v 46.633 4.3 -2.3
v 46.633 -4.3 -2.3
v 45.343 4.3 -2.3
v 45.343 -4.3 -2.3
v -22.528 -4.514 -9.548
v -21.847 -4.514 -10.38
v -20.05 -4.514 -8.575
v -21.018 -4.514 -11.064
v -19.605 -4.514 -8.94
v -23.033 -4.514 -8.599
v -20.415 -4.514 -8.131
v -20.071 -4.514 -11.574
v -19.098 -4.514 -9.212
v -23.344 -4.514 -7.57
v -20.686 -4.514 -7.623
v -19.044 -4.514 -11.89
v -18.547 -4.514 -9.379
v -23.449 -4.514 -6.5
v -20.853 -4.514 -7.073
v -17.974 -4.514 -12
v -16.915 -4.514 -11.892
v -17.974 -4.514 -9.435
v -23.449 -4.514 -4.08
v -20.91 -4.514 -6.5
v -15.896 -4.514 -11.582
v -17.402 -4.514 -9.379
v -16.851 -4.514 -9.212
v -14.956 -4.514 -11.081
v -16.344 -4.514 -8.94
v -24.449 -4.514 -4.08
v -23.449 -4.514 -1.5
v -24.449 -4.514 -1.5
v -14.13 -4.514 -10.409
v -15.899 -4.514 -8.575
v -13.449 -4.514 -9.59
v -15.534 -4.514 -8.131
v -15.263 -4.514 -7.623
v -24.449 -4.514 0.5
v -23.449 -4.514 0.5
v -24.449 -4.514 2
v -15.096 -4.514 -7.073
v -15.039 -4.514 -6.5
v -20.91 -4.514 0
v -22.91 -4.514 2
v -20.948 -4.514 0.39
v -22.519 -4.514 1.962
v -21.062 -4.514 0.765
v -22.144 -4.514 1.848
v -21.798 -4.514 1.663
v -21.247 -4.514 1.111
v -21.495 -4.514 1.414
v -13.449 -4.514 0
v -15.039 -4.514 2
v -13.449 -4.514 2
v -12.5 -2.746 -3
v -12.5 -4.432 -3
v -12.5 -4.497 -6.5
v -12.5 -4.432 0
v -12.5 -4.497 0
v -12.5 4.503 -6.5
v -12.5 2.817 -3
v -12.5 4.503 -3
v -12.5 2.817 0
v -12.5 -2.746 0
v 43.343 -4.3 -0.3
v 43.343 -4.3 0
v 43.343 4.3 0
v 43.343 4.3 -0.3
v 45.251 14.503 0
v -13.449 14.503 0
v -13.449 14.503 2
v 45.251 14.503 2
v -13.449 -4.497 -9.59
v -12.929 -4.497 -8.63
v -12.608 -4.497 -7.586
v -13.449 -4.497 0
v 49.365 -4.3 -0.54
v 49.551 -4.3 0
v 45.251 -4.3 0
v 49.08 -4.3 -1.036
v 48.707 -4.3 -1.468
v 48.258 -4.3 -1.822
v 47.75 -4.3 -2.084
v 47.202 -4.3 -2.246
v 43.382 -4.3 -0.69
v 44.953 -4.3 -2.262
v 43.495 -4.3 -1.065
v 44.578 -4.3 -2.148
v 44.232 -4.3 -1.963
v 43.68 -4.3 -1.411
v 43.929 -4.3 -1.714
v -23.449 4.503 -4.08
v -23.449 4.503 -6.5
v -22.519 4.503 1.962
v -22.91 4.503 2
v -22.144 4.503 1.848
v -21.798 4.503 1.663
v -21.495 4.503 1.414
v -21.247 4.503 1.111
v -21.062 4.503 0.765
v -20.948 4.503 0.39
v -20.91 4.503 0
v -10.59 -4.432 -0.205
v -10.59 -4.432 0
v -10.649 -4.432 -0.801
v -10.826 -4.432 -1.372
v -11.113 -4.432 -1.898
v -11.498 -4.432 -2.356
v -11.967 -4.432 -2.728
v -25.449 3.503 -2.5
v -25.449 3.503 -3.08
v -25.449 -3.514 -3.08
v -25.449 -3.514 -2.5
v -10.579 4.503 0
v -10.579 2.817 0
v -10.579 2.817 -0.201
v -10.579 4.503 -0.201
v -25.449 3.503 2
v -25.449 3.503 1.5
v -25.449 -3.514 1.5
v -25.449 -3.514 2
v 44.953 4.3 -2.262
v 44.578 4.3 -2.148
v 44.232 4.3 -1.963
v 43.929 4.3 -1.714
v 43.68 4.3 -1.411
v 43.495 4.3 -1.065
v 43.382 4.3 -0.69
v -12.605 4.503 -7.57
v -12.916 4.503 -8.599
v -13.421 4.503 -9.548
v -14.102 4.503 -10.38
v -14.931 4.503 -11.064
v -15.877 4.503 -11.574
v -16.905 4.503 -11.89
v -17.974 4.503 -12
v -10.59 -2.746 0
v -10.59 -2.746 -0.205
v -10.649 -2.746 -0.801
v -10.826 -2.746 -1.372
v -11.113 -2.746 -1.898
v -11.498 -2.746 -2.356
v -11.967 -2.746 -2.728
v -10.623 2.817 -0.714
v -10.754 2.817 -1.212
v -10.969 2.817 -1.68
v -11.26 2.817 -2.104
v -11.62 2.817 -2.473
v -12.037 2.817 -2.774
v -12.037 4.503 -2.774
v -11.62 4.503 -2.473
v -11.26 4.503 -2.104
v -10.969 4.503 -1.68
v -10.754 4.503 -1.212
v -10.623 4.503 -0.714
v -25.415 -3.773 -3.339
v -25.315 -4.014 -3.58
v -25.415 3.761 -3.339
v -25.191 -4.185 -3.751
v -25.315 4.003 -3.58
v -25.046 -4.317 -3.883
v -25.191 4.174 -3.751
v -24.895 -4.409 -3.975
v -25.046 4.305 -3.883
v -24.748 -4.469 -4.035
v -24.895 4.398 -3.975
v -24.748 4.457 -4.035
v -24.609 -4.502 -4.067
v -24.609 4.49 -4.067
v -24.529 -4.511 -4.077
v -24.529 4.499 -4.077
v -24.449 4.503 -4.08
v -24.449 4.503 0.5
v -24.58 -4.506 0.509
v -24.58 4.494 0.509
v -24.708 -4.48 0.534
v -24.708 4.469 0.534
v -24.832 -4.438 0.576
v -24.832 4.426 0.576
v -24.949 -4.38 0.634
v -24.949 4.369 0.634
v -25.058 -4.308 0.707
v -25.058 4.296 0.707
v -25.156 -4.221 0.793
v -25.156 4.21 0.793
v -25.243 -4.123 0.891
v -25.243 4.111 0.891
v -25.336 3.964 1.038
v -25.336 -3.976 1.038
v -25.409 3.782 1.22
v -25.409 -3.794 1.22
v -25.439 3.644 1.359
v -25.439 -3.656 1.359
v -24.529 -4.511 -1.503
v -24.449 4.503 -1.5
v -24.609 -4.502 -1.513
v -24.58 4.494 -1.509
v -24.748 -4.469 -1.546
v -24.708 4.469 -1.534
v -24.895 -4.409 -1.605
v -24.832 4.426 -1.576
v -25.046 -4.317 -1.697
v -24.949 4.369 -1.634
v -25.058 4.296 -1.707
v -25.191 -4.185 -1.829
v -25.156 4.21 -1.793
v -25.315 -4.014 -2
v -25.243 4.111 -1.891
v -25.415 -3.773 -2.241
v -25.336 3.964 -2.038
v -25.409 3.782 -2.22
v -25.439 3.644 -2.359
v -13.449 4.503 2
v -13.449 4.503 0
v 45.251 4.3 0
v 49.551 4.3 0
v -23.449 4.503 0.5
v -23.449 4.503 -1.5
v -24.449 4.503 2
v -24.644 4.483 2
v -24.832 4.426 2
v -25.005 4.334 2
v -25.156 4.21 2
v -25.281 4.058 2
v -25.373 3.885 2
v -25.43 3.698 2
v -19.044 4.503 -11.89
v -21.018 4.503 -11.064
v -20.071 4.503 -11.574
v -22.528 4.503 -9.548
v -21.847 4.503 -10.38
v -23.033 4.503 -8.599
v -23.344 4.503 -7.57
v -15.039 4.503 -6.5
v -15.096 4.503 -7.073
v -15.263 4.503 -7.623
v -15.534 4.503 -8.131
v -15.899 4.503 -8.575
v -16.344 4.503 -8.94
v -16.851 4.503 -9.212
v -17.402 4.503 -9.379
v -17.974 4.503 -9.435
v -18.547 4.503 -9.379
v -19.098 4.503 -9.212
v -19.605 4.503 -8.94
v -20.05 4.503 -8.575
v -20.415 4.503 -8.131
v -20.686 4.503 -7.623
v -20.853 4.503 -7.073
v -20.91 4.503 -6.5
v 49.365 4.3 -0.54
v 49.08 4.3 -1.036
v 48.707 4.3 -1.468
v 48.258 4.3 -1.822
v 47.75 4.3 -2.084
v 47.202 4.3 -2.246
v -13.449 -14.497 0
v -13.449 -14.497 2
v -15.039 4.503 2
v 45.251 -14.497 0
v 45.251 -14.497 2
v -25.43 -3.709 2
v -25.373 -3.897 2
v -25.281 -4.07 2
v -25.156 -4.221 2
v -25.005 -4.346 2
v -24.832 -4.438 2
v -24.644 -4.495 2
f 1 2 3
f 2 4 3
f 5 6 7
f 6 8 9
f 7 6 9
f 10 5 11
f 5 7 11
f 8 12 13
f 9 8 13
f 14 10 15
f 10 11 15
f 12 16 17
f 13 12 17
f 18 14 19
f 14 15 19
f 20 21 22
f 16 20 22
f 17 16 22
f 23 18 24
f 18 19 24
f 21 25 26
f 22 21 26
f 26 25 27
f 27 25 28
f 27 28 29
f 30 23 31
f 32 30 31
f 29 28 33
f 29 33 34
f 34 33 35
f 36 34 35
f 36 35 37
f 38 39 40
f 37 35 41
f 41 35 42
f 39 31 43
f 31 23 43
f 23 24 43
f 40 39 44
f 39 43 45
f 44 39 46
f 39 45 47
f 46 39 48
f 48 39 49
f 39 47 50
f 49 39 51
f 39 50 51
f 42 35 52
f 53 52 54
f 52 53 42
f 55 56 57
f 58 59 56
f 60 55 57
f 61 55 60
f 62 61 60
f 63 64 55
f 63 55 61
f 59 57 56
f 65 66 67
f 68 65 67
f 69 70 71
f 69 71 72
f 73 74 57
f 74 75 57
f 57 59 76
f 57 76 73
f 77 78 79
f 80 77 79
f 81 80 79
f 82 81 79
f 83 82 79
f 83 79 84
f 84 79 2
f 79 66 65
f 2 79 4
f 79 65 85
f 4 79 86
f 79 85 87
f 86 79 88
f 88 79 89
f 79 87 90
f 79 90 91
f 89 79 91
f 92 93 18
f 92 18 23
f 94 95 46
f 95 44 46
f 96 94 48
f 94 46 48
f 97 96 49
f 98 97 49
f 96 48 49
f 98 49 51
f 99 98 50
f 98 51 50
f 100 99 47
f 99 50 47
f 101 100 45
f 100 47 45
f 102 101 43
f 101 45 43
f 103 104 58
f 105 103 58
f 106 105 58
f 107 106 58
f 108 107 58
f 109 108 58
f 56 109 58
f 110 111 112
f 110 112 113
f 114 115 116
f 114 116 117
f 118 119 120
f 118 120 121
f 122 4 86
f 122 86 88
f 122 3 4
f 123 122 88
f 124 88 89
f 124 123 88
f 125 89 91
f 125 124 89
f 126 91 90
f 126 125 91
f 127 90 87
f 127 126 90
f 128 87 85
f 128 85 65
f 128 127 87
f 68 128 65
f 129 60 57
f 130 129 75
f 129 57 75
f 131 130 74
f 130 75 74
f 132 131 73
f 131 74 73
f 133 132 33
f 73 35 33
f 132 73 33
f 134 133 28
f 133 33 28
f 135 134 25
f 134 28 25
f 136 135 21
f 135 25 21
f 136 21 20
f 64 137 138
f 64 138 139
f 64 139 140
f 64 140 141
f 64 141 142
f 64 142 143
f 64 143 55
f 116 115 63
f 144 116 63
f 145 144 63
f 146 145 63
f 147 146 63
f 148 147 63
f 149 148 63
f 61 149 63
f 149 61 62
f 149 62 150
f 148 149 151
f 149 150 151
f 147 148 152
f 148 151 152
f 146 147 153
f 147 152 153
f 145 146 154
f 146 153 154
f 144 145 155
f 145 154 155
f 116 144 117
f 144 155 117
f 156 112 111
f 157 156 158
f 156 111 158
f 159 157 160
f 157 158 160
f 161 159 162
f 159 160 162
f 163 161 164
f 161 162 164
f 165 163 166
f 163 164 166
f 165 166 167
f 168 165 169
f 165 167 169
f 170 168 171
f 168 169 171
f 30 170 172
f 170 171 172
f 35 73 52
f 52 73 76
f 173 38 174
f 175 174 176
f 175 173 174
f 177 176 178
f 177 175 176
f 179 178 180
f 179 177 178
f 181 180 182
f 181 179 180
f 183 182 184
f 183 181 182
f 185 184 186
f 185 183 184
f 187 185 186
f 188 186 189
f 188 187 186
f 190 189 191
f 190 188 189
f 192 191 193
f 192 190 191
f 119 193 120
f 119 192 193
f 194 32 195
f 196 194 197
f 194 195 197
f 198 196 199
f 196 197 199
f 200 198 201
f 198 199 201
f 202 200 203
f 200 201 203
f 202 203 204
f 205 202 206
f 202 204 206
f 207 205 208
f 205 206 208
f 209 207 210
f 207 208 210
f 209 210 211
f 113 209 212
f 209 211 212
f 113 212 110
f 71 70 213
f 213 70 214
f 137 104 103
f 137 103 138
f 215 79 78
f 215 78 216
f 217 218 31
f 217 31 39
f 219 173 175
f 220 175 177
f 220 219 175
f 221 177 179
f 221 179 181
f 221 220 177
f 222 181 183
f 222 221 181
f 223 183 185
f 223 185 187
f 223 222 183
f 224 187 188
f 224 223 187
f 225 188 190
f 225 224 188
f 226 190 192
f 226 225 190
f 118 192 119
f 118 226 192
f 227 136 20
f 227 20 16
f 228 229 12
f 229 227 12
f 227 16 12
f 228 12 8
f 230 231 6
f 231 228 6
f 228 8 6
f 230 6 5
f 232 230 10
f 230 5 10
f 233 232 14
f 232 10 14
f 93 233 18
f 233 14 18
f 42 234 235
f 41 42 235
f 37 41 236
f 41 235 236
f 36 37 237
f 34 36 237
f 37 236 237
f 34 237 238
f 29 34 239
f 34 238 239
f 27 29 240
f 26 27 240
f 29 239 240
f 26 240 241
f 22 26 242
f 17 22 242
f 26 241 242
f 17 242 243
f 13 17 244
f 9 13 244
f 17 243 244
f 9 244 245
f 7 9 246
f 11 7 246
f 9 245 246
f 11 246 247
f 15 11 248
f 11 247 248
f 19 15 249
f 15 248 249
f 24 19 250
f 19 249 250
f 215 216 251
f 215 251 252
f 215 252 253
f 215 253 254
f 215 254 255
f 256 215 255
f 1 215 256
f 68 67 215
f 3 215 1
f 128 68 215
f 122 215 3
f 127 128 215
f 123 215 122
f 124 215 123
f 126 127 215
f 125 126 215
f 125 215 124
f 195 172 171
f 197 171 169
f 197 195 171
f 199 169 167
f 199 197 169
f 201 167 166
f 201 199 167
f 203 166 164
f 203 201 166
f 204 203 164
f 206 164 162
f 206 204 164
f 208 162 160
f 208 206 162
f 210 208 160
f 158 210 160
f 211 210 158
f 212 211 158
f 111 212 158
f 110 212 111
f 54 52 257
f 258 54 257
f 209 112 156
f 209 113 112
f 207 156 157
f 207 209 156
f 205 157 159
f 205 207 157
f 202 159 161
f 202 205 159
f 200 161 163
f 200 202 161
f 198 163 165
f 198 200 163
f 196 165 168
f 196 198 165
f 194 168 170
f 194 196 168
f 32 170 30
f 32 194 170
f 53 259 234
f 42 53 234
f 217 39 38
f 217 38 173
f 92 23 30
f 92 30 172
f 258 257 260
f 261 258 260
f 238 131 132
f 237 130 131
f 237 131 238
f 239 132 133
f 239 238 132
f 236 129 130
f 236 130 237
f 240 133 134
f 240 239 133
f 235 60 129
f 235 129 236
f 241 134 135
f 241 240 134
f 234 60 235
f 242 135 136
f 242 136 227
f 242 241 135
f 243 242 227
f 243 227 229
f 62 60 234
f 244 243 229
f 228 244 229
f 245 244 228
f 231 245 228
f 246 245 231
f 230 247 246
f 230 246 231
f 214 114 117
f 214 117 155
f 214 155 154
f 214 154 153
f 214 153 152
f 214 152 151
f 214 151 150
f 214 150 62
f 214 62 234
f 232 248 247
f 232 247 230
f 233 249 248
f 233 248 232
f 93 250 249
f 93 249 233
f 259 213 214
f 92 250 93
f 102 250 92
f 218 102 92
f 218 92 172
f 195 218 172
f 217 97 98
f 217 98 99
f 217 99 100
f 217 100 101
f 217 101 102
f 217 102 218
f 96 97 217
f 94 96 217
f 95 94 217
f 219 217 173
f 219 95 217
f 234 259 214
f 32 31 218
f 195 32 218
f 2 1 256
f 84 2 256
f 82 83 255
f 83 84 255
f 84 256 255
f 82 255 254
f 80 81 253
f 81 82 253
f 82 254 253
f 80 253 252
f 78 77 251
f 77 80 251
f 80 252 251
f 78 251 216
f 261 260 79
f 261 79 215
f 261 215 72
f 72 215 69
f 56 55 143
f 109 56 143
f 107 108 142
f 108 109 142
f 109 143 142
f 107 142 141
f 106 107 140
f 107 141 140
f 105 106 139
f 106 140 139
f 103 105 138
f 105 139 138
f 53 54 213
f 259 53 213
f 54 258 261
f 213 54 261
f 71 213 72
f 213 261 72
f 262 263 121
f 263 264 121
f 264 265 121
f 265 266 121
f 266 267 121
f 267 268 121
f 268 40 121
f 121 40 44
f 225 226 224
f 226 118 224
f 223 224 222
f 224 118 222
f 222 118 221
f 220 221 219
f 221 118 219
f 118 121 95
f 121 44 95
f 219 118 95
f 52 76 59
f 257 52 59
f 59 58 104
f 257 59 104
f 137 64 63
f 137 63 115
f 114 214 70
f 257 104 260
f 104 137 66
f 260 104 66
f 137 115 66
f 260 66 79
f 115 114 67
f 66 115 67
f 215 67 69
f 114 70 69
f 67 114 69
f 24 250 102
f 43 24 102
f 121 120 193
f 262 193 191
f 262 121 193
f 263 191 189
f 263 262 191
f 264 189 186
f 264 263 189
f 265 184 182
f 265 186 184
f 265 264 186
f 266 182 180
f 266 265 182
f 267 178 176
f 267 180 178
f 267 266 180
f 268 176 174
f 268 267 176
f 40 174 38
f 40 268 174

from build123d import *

# Parameters (mm, degrees)
SKETCH1_W           = 58.7
SKETCH1_H           = 14.5
BOSS_EXTRUDE1_DEPTH = 2
SKETCH2_W           = 1.907537222
SKETCH2_H           = 8.6
BOSS_EXTRUDE2_DEPTH = 4.3
SKETCH3_W           = 2.3
SKETCH3_H           = 8.6
BOSS_EXTRUDE3_DEPTH = 4.3
FILLET3_R           = 2
SKETCH4_W           = 0.949738238
SKETCH4_H           = 9
BOSS_EXTRUDE4_DEPTH = 12
SKETCH5_W           = 14
SKETCH5_H           = 9.016953004
BOSS_EXTRUDE5_DEPTH = 10
FILLET4_R           = 5.5
CUT_EXTRUDE1_DEPTH  = 12
SKETCH8_W           = 2.580145407
SKETCH8_H           = 9.016953004
SKETCH8_W_2         = 1.5
BOSS_EXTRUDE6_DEPTH = 2
SKETCH9_W           = 1.920869139
SKETCH9_H           = 1.685794619
SKETCH9_H_2         = 1.68579462
BOSS_EXTRUDE7_DEPTH = 3
FILLET6_R           = 3
FILLET9_R           = 3
FILLET11_R          = 1
FILLET12_R          = 1
FILLET13_R          = 2


with BuildPart() as part:
    # Sketch1 → Boss-Extrude1 (new body)
    with BuildSketch(Plane.XY):
        with Locations((15.900667763, -7.24741023)):
            Rectangle(SKETCH1_W, SKETCH1_H)
        with Locations((15.900667763, 7.25258977)):
            Rectangle(SKETCH1_W, SKETCH1_H)
    extrude(amount=BOSS_EXTRUDE1_DEPTH)

    # Sketch2 → Boss-Extrude2 (add)
    with BuildSketch(Plane.XY.offset(2)):
        with Locations((44.296899152, 0)):
            Rectangle(SKETCH2_W, SKETCH2_H)
    extrude(amount=-BOSS_EXTRUDE2_DEPTH)

    # Sketch3 → Boss-Extrude3 (add)
    with BuildSketch(Plane(origin=(45.250667763, 0, 0), x_dir=(0, 0, -1), z_dir=(1, 0, 0))):
        with Locations((1.15, 0)):
            Rectangle(SKETCH3_W, SKETCH3_H)
    extrude(amount=BOSS_EXTRUDE3_DEPTH)

    # Fillet3
    fillet3_edges = [part.edges().sort_by_distance(p)[0] for p in [
        (43.343130541, 0, -2.3),
    ]]
    fillet(fillet3_edges, radius=FILLET3_R)

    # Sketch4 → Boss-Extrude4 (add)
    with BuildSketch(Plane(origin=(0, 0, 0), x_dir=(-1, 0, 0), z_dir=(0, 0, -1))):
        with Locations((12.974463118, 0.00258977)):
            Rectangle(SKETCH4_W, SKETCH4_H)
    extrude(amount=BOSS_EXTRUDE4_DEPTH)

    # Sketch5 → Boss-Extrude5 (add)
    with BuildSketch(Plane.ZY.offset(13.449332237)):
        with Locations((-5, -0.005886732)):
            Rectangle(SKETCH5_W, SKETCH5_H)
    extrude(amount=BOSS_EXTRUDE5_DEPTH)

    # Fillet4
    # the kernel refuses this fillet: 5.5 mm, written as the material it takes off along each edge
    with BuildSketch(Plane(origin=(-23.449332237, -18.264363234, -12), x_dir=(1, 0, 0), z_dir=(0, 1, 0))) as fillet4_piece_1:
        with BuildLine():
            CenterArc((FILLET4_R, -FILLET4_R), FILLET4_R, 90, 90)
            Line((0, -FILLET4_R), (0, 0))
            Line((0, 0), (FILLET4_R, 0))
        make_face()
    extrude(amount=36.516953004, mode=Mode.SUBTRACT)
    with BuildSketch(Plane(origin=(-12.499593999, -18.24741023, -12), x_dir=(-1, 0, 0), z_dir=(0, 1, 0))) as fillet4_piece_2:
        with BuildLine():
            CenterArc((FILLET4_R, FILLET4_R), FILLET4_R, 180, 90)
            Line((0, FILLET4_R), (0, 0))
            Line((0, 0), (FILLET4_R, 0))
        make_face()
    extrude(amount=36.5, mode=Mode.SUBTRACT)

    # Sketch7 → Cut-Extrude1 (cut)
    with BuildSketch(Plane(origin=(0, 4.50258977, 0), x_dir=(1, 0, 0), z_dir=(0, 1, 0))):
        with BuildLine():
            ThreePointArc((-15.03934254, 6.5), (-17.974463118, 9.435120578), (-20.909583696, 6.5))
            Line((-20.909583696, 6.5), (-15.03934254, 6.5))
        make_face()
        with BuildLine():
            Line((-15.03934254, 6.5), (-20.909583696, 6.5))
            ThreePointArc((-20.909583696, 6.5), (-17.974463118, 3.564879422), (-15.03934254, 6.5))
        make_face()
        with BuildLine():
            ThreePointArc((-15.03934254, 6.5), (-17.974463118, 3.564879422), (-20.909583696, 6.5))
            Line((-20.909583696, 6.5), (-20.909583696, -2))
            Line((-20.909583696, -2), (-15.03934254, -2))
            Line((-15.03934254, -2), (-15.03934254, 6.5))
        make_face()
    extrude(amount=-CUT_EXTRUDE1_DEPTH, mode=Mode.SUBTRACT)

    # Sketch8 → Boss-Extrude6 (add)
    with BuildSketch(Plane.ZY.offset(23.449332237)):
        with Locations((-2.790072703, -0.005886732)):
            Rectangle(SKETCH8_W, SKETCH8_H)
        with Locations((1.25, -0.005886732)):
            Rectangle(SKETCH8_W_2, SKETCH8_H)
    extrude(amount=BOSS_EXTRUDE6_DEPTH)

    # Sketch9 → Boss-Extrude7 (add)
    with BuildSketch(Plane(origin=(0, 0, 0), x_dir=(-1, 0, 0), z_dir=(0, 0, -1))):
        with Locations((11.550124457, -3.589191377)):
            Rectangle(SKETCH9_W, SKETCH9_H)
        with Locations((11.539159429, 3.65969246)):
            Rectangle(SKETCH9_W, SKETCH9_H_2)
    extrude(amount=BOSS_EXTRUDE7_DEPTH)

    # Fillet6
    # the kernel refuses this fillet: 3 mm, written as the material it takes off along each edge
    with BuildSketch(Plane(origin=(-10.589689887, 4.241056538, -3), x_dir=(-1, 0, 0), z_dir=(0, -1, 0))) as fillet6_piece_1_section:
        with BuildLine():
            CenterArc((3, -2.794940242), FILLET6_R, 111.307014795, 68.692985205)
            Line((0, -2.794940242), (0, 0))
            Line((0, 0), (1.909904112, 0))
        make_face()
    fillet6_piece_1 = extrude(amount=15.660495829, mode=Mode.PRIVATE)
    fillet6_piece_1 = split(fillet6_piece_1, bisect_by=Plane(origin=(-11.107813793, 2.81679515, -1.901033535), z_dir=(0, -1, 0)), keep=Keep.TOP, mode=Mode.PRIVATE)
    add(fillet6_piece_1, mode=Mode.SUBTRACT)
    with BuildSketch(Plane(origin=(-10.57872486, 11.500570097, -3), x_dir=(-1, 0, 0), z_dir=(0, -1, 0))) as fillet6_piece_2:
        with BuildLine():
            CenterArc((3, -2.799192131), FILLET6_R, 111.082404826, 68.917595174)
            Line((0, -2.799192131), (0, 0))
            Line((0, 0), (1.920869139, 0))
        make_face()
    extrude(amount=15.681755273, mode=Mode.SUBTRACT)

    # Fillet9
    # the kernel refuses this fillet: 3 mm, written as the material it takes off along each edge
    with BuildSketch(Plane(origin=(49.550667763, 11.592976073, -2.3), x_dir=(-1, 0, 0), z_dir=(0, -1, 0))) as fillet9_piece_1:
        with BuildLine():
            CenterArc((2.917190429, -3), FILLET9_R, 90, 76.506601178)
            Line((0, -2.3), (-0.058343809, -2.286))
            ThreePointArc((-0.058343809, -2.286), (-0.06, -1.15), (-0.06, 0))
            Line((-0.06, 0), (0, 0.06))
            Line((0, 0.06), (2.917190429, 0.06))
            Line((2.917190429, 0.06), (2.917190429, 0))
        make_face()
    extrude(amount=23.185952146, mode=Mode.SUBTRACT)

    # Fillet11
    fillet11_edges = [part.edges().sort_by_distance(p)[0] for p in [
        (-25.449332237, -0.005886732, -4.080145407),
        (-25.449332237, -4.514363234, -2.790072704),
        (-25.449332237, -0.005886732, -1.5),
        (-25.449332237, 4.50258977, -2.790072704),
    ]]
    fillet(fillet11_edges, radius=FILLET11_R)

    # Fillet12
    fillet12_edges = [part.edges().sort_by_distance(p)[0] for p in [
        (-25.449332237, 4.50258977, 1.25),
        (-25.449332237, -0.005886732, 0.5),
        (-25.449332237, -4.514363234, 1.25),
    ]]
    fillet(fillet12_edges, radius=FILLET12_R)

    # Fillet13
    fillet13_edges = [part.edges().sort_by_distance(p)[0] for p in [
        (-20.909583696, -0.005886732, 2),
    ]]
    fillet(fillet13_edges, radius=FILLET13_R)


solid = part.part
